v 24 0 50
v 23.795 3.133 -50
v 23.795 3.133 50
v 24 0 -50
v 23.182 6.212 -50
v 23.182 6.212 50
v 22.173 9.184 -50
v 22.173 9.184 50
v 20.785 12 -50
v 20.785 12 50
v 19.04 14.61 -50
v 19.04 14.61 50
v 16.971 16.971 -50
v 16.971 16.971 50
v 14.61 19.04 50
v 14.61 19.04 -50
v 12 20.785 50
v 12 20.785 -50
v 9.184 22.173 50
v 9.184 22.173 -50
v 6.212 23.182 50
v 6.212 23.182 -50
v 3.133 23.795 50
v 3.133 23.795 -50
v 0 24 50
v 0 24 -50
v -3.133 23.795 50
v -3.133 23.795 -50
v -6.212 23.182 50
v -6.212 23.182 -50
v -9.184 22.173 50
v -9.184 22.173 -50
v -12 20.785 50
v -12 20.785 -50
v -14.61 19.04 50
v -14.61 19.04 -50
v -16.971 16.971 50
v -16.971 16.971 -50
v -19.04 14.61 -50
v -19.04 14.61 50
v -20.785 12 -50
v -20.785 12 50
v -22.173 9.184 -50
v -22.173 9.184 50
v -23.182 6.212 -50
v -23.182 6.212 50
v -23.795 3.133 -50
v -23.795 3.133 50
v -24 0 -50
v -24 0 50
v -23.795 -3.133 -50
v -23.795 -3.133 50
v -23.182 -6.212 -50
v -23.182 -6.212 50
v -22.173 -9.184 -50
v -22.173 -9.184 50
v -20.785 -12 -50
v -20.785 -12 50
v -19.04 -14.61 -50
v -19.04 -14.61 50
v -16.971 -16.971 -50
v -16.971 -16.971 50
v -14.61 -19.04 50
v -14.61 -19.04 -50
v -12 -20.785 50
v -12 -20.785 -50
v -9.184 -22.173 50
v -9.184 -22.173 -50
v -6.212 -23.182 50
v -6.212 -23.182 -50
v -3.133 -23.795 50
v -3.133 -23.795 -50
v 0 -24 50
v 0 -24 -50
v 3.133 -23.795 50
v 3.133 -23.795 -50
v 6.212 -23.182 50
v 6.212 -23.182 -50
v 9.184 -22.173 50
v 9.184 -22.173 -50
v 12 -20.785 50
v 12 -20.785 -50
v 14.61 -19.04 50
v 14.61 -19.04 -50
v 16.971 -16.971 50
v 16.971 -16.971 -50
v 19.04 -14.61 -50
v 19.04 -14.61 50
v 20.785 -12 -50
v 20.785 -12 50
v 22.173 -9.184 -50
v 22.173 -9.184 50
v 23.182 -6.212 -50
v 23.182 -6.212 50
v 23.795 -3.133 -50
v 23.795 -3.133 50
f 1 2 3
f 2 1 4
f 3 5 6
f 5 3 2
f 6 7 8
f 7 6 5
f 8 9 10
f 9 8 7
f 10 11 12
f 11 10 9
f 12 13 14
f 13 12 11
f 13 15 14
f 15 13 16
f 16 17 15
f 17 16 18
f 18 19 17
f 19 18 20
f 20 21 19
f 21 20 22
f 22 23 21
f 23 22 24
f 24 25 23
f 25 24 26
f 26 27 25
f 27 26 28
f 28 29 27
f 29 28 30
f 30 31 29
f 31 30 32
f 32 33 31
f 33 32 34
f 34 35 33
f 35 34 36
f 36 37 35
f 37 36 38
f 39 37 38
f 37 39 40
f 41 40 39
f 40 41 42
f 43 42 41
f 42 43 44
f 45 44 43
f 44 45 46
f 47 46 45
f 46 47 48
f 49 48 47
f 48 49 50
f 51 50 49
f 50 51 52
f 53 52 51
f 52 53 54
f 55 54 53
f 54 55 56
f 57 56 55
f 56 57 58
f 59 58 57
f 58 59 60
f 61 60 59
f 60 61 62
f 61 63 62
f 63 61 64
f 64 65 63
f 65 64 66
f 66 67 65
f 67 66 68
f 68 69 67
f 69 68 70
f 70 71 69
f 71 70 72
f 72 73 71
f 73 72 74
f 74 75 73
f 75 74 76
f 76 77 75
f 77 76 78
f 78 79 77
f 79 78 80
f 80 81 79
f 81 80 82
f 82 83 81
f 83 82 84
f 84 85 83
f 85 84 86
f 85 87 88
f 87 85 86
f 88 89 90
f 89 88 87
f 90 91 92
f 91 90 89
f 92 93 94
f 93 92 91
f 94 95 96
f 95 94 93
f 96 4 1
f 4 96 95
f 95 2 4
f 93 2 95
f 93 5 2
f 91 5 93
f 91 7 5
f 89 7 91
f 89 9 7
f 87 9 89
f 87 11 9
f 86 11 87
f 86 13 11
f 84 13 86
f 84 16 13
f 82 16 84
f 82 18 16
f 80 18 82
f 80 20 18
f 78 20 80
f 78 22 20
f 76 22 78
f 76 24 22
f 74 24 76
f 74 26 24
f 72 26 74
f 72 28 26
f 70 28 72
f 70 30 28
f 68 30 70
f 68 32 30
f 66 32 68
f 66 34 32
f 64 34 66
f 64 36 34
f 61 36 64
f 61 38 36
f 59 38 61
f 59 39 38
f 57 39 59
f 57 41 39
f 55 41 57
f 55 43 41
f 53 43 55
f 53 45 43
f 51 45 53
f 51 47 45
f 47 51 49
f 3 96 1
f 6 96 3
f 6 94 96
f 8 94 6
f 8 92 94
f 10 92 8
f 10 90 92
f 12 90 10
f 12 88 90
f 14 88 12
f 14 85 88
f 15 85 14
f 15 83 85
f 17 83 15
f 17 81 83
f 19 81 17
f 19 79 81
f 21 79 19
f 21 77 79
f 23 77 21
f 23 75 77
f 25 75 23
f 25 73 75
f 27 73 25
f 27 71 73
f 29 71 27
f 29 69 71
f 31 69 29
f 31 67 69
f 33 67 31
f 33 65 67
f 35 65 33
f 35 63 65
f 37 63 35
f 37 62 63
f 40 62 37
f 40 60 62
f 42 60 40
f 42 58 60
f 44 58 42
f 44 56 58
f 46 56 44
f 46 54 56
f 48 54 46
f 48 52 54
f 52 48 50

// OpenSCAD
// ========================================
// a cylinder with radius 24 mm and height 100 mm
// NeuroCAD canonical IR; dimensions are millimetres
// ========================================
$fn = 48;

cylinder(r=24, h=100, center=true);
